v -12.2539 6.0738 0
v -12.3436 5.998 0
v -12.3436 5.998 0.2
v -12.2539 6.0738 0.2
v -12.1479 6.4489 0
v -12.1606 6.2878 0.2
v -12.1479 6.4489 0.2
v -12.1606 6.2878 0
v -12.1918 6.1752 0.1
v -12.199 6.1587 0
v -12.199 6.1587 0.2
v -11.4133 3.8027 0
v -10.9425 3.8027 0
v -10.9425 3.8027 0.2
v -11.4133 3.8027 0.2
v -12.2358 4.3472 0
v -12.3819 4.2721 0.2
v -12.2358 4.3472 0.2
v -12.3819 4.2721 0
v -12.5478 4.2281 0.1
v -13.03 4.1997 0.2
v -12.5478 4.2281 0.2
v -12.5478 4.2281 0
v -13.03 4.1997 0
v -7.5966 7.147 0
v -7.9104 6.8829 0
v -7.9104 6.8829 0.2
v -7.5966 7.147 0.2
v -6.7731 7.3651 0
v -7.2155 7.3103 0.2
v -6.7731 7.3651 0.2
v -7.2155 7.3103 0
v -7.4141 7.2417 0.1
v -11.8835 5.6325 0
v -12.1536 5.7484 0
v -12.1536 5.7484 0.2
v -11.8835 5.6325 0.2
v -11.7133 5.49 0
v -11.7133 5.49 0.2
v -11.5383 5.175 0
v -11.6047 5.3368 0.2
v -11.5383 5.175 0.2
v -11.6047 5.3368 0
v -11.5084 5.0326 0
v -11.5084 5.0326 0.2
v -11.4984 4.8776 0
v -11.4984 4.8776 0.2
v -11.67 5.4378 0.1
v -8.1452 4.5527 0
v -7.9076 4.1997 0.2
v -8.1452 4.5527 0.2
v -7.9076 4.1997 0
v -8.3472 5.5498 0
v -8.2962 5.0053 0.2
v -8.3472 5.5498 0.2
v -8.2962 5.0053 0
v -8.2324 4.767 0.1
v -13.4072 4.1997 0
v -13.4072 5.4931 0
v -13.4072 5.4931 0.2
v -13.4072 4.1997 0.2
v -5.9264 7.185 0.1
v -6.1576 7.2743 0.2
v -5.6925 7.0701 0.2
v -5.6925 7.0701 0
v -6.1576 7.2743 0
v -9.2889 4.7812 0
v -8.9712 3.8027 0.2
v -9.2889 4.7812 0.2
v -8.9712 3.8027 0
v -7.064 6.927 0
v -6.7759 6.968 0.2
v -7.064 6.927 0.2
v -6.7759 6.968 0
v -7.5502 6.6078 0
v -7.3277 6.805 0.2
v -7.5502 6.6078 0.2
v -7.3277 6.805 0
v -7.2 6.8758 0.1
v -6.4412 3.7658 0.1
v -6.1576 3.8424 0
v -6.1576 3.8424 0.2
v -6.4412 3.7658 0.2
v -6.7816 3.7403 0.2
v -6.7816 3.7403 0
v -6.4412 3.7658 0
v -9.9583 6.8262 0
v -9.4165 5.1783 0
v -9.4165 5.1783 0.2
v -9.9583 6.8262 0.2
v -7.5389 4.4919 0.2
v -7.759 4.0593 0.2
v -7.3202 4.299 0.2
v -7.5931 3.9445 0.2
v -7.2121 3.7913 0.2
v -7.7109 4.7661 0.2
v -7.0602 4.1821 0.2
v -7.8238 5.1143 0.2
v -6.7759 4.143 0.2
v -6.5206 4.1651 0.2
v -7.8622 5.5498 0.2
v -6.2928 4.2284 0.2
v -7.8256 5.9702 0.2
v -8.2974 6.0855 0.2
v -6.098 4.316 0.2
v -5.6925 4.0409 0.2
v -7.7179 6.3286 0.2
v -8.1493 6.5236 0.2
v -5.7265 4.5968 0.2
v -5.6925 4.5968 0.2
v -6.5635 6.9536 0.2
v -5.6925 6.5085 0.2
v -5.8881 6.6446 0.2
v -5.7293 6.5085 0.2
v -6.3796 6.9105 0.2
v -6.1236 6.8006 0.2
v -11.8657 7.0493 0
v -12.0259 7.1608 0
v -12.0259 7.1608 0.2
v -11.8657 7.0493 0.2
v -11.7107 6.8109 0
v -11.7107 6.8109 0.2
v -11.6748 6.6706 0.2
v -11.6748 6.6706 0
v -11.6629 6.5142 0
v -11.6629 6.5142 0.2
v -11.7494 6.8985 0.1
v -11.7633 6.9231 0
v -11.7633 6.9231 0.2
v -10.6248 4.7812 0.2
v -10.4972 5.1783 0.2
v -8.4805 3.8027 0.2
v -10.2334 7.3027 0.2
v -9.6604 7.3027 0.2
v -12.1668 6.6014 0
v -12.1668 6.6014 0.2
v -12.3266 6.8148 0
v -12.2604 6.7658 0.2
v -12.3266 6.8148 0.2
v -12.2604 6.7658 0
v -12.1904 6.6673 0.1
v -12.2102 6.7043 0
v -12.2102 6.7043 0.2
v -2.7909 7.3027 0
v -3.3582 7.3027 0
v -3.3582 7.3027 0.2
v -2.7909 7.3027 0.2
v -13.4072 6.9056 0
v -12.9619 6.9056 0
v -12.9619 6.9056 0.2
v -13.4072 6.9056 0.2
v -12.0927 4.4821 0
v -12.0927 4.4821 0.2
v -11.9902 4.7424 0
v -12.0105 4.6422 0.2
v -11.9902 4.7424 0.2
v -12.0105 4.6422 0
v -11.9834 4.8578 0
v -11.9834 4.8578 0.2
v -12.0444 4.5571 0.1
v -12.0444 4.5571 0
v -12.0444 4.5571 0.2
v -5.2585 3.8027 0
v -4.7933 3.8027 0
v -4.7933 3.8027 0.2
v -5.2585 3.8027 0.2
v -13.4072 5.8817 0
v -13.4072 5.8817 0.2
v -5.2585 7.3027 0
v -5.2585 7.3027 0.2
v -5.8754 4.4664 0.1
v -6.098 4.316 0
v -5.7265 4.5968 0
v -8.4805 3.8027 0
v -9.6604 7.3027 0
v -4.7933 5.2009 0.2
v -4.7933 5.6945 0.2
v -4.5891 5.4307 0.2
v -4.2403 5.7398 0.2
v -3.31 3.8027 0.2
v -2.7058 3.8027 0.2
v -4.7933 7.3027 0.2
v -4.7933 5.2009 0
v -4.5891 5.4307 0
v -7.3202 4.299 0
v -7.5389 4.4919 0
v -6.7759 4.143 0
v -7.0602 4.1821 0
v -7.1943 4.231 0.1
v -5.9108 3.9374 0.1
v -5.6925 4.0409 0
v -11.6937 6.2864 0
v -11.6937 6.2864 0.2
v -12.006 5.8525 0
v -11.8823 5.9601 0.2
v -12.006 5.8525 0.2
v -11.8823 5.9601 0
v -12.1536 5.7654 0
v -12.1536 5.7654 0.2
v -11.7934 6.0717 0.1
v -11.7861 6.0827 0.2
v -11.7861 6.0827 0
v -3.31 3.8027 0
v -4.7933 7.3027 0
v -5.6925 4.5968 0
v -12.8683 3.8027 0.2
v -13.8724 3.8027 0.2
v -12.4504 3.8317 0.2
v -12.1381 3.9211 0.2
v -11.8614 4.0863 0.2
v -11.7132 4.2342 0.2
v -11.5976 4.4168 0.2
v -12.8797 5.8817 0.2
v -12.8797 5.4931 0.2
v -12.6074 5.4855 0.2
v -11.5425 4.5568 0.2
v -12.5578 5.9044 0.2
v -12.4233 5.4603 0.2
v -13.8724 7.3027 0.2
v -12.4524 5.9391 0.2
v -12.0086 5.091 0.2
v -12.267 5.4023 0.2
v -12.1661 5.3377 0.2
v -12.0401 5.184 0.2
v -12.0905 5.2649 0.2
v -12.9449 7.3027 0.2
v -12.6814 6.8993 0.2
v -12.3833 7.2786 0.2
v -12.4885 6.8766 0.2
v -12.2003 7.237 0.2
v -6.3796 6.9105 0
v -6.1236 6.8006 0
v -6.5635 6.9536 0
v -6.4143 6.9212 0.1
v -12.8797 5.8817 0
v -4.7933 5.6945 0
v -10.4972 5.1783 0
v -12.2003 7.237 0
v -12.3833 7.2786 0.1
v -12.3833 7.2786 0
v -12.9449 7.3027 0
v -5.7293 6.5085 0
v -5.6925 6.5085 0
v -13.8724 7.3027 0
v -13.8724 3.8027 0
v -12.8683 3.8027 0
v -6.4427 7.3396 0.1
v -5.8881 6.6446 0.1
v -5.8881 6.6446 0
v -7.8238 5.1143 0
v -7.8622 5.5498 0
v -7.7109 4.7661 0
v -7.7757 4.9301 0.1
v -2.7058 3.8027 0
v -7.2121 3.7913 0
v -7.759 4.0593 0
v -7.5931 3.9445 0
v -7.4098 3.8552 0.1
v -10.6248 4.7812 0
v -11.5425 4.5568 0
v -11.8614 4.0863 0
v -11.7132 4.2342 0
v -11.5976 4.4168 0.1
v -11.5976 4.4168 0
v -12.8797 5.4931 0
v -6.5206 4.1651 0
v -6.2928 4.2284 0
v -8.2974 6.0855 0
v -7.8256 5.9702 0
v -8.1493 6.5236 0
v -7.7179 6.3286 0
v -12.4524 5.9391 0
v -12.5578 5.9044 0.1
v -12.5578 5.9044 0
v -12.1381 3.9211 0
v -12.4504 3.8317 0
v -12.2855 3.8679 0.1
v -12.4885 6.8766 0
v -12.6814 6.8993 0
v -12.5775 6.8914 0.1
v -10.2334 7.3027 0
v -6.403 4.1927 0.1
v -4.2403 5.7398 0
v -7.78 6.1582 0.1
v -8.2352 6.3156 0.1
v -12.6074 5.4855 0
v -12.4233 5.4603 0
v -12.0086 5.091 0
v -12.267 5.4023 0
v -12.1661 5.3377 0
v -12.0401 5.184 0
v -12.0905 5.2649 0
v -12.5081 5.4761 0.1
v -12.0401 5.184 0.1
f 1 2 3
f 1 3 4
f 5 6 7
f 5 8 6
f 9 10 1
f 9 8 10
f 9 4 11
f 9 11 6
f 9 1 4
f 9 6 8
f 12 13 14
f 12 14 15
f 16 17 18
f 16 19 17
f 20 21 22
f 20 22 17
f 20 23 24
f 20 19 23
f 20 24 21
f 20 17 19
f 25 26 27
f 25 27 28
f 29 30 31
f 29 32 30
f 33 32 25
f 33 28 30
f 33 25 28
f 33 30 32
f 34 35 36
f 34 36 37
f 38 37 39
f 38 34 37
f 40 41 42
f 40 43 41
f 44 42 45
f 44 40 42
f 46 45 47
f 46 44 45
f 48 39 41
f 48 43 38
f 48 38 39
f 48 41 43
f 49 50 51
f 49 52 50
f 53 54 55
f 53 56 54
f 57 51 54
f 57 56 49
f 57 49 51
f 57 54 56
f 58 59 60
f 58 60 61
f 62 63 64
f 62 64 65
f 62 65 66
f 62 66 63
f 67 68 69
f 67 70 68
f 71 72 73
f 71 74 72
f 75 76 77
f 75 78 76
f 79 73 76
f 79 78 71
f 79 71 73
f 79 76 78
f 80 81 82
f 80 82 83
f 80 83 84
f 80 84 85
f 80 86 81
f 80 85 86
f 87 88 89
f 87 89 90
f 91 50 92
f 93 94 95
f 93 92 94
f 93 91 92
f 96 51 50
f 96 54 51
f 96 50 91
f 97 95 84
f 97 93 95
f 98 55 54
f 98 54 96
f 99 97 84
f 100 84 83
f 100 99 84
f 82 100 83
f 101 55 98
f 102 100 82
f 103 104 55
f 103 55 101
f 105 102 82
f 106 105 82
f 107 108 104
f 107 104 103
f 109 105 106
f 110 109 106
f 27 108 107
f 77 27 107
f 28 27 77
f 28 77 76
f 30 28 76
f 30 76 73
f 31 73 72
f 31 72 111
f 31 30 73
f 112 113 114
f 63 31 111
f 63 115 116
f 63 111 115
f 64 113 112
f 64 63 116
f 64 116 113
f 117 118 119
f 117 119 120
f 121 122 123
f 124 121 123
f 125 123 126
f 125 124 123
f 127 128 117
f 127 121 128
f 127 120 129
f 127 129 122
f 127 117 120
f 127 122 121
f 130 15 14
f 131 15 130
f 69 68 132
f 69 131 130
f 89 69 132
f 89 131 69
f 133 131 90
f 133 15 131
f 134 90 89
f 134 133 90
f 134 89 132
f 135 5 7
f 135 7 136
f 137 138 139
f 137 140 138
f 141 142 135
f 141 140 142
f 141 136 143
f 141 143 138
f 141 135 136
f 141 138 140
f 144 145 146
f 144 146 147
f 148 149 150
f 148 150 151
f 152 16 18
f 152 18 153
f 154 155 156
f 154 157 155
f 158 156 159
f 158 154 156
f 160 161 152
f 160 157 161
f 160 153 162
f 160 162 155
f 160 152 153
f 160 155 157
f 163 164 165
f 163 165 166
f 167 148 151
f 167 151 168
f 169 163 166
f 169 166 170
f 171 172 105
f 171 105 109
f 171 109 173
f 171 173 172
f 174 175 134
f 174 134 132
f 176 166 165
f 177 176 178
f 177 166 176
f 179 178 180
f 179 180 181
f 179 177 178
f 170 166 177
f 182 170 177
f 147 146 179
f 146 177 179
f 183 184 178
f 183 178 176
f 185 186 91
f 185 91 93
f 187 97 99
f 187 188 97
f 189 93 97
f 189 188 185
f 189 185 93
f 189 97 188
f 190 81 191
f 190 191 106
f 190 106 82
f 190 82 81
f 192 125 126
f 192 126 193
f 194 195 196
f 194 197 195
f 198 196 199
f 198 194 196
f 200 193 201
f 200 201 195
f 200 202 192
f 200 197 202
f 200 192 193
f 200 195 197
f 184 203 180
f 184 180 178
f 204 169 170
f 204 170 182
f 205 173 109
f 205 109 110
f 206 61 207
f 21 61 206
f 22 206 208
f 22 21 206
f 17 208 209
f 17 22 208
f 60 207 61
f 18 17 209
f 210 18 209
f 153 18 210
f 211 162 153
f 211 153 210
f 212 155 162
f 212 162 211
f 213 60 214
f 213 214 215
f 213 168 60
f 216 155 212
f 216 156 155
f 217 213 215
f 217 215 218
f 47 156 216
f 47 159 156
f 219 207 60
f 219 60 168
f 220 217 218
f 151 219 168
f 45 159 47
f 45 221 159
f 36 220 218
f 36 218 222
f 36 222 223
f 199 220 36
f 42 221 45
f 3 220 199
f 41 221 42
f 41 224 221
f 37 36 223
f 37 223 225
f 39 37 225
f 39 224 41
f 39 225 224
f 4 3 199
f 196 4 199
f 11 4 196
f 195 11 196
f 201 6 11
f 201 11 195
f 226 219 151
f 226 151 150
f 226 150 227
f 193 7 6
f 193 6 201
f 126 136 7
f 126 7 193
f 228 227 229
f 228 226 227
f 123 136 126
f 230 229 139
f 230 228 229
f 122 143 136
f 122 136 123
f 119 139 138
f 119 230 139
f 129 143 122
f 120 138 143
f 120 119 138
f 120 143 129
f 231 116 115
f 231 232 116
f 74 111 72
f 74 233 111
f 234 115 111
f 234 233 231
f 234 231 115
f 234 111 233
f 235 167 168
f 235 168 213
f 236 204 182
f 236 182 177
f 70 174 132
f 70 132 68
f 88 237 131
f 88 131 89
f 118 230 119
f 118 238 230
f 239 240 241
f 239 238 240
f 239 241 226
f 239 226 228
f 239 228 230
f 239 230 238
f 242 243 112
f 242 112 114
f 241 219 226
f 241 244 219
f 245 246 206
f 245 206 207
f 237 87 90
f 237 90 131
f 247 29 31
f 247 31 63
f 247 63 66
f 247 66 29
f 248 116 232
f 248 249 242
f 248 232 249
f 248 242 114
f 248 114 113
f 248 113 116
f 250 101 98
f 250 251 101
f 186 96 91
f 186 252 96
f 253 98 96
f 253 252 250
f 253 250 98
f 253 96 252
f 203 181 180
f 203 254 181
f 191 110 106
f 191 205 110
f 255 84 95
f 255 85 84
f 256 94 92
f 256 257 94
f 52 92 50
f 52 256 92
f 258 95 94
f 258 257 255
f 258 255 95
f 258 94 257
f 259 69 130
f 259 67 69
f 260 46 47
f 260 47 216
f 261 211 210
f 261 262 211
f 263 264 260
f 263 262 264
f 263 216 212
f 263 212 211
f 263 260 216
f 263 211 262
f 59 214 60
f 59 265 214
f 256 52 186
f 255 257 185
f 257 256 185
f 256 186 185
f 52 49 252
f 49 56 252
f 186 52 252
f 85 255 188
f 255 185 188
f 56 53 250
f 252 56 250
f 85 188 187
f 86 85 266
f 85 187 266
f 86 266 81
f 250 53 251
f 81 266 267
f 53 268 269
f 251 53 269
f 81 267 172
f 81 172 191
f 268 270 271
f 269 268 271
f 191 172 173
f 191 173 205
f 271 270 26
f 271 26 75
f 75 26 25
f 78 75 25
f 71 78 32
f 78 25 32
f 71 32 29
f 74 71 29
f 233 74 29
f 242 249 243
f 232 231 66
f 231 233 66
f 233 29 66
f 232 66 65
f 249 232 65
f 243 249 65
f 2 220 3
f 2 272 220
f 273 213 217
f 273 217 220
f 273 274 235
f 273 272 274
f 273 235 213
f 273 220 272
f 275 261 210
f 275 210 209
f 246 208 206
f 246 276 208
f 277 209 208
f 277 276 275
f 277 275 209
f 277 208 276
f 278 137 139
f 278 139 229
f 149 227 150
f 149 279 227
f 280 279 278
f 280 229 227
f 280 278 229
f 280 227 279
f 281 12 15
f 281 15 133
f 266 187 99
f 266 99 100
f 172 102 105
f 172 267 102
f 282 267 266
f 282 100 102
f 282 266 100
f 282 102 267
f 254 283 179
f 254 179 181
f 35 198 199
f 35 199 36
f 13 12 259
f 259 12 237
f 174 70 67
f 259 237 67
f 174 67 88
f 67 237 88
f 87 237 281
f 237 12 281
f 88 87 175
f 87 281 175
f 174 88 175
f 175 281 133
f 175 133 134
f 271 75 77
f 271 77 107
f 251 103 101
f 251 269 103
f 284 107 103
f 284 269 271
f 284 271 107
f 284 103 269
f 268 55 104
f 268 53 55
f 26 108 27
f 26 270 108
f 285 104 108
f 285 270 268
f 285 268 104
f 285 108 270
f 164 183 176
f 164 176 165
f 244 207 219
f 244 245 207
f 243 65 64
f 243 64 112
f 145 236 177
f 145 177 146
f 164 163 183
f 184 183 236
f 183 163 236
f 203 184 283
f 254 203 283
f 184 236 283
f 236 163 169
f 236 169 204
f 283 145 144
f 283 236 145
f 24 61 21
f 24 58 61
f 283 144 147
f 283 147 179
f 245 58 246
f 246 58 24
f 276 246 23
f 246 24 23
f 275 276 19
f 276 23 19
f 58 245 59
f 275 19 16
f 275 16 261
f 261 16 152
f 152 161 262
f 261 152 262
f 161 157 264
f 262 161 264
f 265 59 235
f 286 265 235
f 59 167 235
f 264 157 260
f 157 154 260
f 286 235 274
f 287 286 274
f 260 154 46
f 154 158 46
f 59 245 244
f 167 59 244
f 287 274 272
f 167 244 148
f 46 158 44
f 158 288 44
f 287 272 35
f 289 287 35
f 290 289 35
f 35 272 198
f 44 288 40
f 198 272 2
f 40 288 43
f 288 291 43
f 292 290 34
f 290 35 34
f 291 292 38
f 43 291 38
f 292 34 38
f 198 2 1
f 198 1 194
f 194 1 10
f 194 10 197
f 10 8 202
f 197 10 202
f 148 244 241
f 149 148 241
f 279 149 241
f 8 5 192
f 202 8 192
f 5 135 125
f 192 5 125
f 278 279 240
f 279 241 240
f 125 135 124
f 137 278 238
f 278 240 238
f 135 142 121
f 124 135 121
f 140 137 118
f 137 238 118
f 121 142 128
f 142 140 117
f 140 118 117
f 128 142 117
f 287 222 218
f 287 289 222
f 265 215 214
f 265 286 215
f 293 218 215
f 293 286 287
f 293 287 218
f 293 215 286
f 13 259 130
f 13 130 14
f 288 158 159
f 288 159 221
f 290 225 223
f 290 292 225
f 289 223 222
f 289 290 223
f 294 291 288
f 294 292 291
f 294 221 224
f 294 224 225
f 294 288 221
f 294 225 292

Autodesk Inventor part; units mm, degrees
ref_plane "YZ Plane" through (0, 0, 0) normal (1, 0, 0) x (0, 1, 0)
ref_plane "XZ Plane" through (0, 0, 0) normal (0, 1, 0) x (-1, 0, 0)
ref_plane "XY Plane" through (0, 0, 0) normal (0, 0, 1) x (1, 0, 0)
sketch "Sketch1" plane through (0, 0, 0) normal (0, 0, 1) x (1, 0, 0)
  line L0 (-14.2269, 7.3651) -> (16.5142, 7.3651) construction
  line L1 (16.5142, 7.3651) -> (16.5142, -10.6587) construction
  line L2 (16.5142, -10.6587) -> (-14.2269, -10.6587) construction
  line L3 (-14.2269, -10.6587) -> (-14.2269, 7.3651) construction
  spline S0 degree 2 poles (-11.4984, 4.8776) (-11.4984, 4.6167) (-11.6969, 4.2168) (-11.8614, 4.0863) knots 0 0 0 1 2 2 2
  spline S1 degree 2 poles (-11.8614, 4.0863) (-12.06, 3.9331) (-12.5109, 3.8027) (-12.8683, 3.8027) knots 0 0 0 1 2 2 2
  line L4 (-12.8683, 3.8027) -> (-13.8724, 3.8027)
  line L5 (-13.8724, 3.8027) -> (-13.8724, 7.3027)
  line L6 (-13.8724, 7.3027) -> (-12.9449, 7.3027)
  spline S2 degree 2 poles (-12.9449, 7.3027) (-12.5705, 7.3027) (-12.1961, 7.2544) (-12.0259, 7.1608) knots 0 0 0 1 2 2 2
  spline S3 degree 2 poles (-12.0259, 7.1608) (-11.8359, 7.0616) (-11.6629, 6.7354) (-11.6629, 6.5142) knots 0 0 0 1 2 2 2
  spline S4 degree 2 poles (-11.6629, 6.5142) (-11.6629, 6.2674) (-11.9238, 5.876) (-12.1536, 5.7654) knots 0 0 0 1 2 2 2
  line L7 (-12.1536, 5.7654) -> (-12.1536, 5.7484)
  spline S5 degree 2 poles (-12.1536, 5.7484) (-11.8416, 5.6633) (-11.4984, 5.2123) (-11.4984, 4.8776) knots 0 0 0 1 2 2 2
  spline S6 degree 2 poles (-11.9834, 4.8578) (-11.9834, 5.0563) (-12.0968, 5.3116) (-12.267, 5.4023) knots 0 0 0 1 2 2 2
  spline S7 degree 2 poles (-12.267, 5.4023) (-12.3776, 5.4591) (-12.6386, 5.4931) (-12.8797, 5.4931) knots 0 0 0 1 2 2 2
  line L8 (-12.8797, 5.4931) -> (-13.4072, 5.4931)
  line L9 (-13.4072, 5.4931) -> (-13.4072, 4.1997)
  line L10 (-13.4072, 4.1997) -> (-13.03, 4.1997)
  spline S8 degree 2 poles (-13.03, 4.1997) (-12.7237, 4.1997) (-12.372, 4.2565) (-12.2358, 4.3472) knots 0 0 0 1 2 2 2
  spline S9 degree 2 poles (-12.2358, 4.3472) (-12.1053, 4.4408) (-11.9834, 4.6734) (-11.9834, 4.8578) knots 0 0 0 1 2 2 2
  spline S10 degree 2 poles (-12.1479, 6.4489) (-12.1479, 6.5737) (-12.233, 6.7609) (-12.3266, 6.8148) knots 0 0 0 1 2 2 2
  spline S11 degree 2 poles (-12.3266, 6.8148) (-12.44, 6.8772) (-12.7151, 6.9056) (-12.9619, 6.9056) knots 0 0 0 1 2 2 2
  line L11 (-12.9619, 6.9056) -> (-13.4072, 6.9056)
  line L12 (-13.4072, 6.9056) -> (-13.4072, 5.8817)
  line L13 (-13.4072, 5.8817) -> (-12.8797, 5.8817)
  spline S12 degree 2 poles (-12.8797, 5.8817) (-12.6613, 5.8817) (-12.4542, 5.927) (-12.3436, 5.998) knots 0 0 0 1 2 2 2
  spline S13 degree 2 poles (-12.3436, 5.998) (-12.2358, 6.066) (-12.1479, 6.2844) (-12.1479, 6.4489) knots 0 0 0 1 2 2 2
  line L14 (-11.4133, 3.8027) -> (-10.2334, 7.3027)
  line L15 (-10.2334, 7.3027) -> (-9.6604, 7.3027)
  line L16 (-9.6604, 7.3027) -> (-8.4805, 3.8027)
  line L17 (-8.4805, 3.8027) -> (-8.9712, 3.8027)
  line L18 (-8.9712, 3.8027) -> (-9.2889, 4.7812)
  line L19 (-9.2889, 4.7812) -> (-10.6248, 4.7812)
  line L20 (-10.6248, 4.7812) -> (-10.9425, 3.8027)
  line L21 (-10.9425, 3.8027) -> (-11.4133, 3.8027)
  line L22 (-9.4165, 5.1783) -> (-9.9583, 6.8262)
  line L23 (-9.9583, 6.8262) -> (-10.4972, 5.1783)
  line L24 (-10.4972, 5.1783) -> (-9.4165, 5.1783)
  spline S14 degree 2 poles (-6.7816, 3.7403) (-7.122, 3.7403) (-7.6977, 3.97) (-7.9076, 4.1997) knots 0 0 0 1 2 2 2
  spline S15 degree 2 poles (-7.9076, 4.1997) (-8.1175, 4.4266) (-8.3472, 5.1074) (-8.3472, 5.5498) knots 0 0 0 1 2 2 2
  spline S16 degree 2 poles (-8.3472, 5.5498) (-8.3472, 5.9894) (-8.1232, 6.6418) (-7.9104, 6.8829) knots 0 0 0 1 2 2 2
  spline S17 degree 2 poles (-7.9104, 6.8829) (-7.7006, 7.1183) (-7.1276, 7.3651) (-6.7731, 7.3651) knots 0 0 0 1 2 2 2
  spline S18 degree 2 poles (-6.7731, 7.3651) (-6.5972, 7.3651) (-6.2881, 7.314) (-6.1576, 7.2743) knots 0 0 0 1 2 2 2
  spline S19 degree 2 poles (-6.1576, 7.2743) (-6.0442, 7.2374) (-5.8087, 7.1325) (-5.6925, 7.0701) knots 0 0 0 1 2 2 2
  line L25 (-5.6925, 7.0701) -> (-5.6925, 6.5085)
  line L26 (-5.6925, 6.5085) -> (-5.7293, 6.5085)
  spline S20 degree 2 poles (-5.7293, 6.5085) (-5.7917, 6.5652) (-5.9846, 6.724) (-6.1236, 6.8006) knots 0 0 0 1 2 2 2
  spline S21 degree 2 poles (-6.1236, 6.8006) (-6.2569, 6.8744) (-6.5717, 6.968) (-6.7759, 6.968) knots 0 0 0 1 2 2 2
  spline S22 degree 2 poles (-6.7759, 6.968) (-7, 6.968) (-7.3999, 6.7836) (-7.5502, 6.6078) knots 0 0 0 1 2 2 2
  spline S23 degree 2 poles (-7.5502, 6.6078) (-7.6977, 6.4291) (-7.8622, 5.8873) (-7.8622, 5.5498) knots 0 0 0 1 2 2 2
  spline S24 degree 2 poles (-7.8622, 5.5498) (-7.8622, 5.1896) (-7.6892, 4.6706) (-7.5389, 4.4919) knots 0 0 0 1 2 2 2
  spline S25 degree 2 poles (-7.5389, 4.4919) (-7.3914, 4.3189) (-6.9972, 4.143) (-6.7759, 4.143) knots 0 0 0 1 2 2 2
  spline S26 degree 2 poles (-6.7759, 4.143) (-6.5745, 4.143) (-6.2314, 4.2423) (-6.098, 4.316) knots 0 0 0 1 2 2 2
  spline S27 degree 2 poles (-6.098, 4.316) (-5.9704, 4.3898) (-5.7804, 4.5429) (-5.7265, 4.5968) knots 0 0 0 1 2 2 2
  line L27 (-5.7265, 4.5968) -> (-5.6925, 4.5968)
  line L28 (-5.6925, 4.5968) -> (-5.6925, 4.0409)
  spline S28 degree 2 poles (-5.6925, 4.0409) (-5.8087, 3.987) (-6.013, 3.8877) (-6.1576, 3.8424) knots 0 0 0 1 2 2 2
  spline S29 degree 2 poles (-6.1576, 3.8424) (-6.3108, 3.7913) (-6.5717, 3.7403) (-6.7816, 3.7403) knots 0 0 0 1 2 2 2
  line L29 (-2.7058, 3.8027) -> (-3.31, 3.8027)
  line L30 (-3.31, 3.8027) -> (-4.5891, 5.4307)
  line L31 (-4.5891, 5.4307) -> (-4.7933, 5.2009)
  line L32 (-4.7933, 5.2009) -> (-4.7933, 3.8027)
  line L33 (-4.7933, 3.8027) -> (-5.2585, 3.8027)
  line L34 (-5.2585, 3.8027) -> (-5.2585, 7.3027)
  line L35 (-5.2585, 7.3027) -> (-4.7933, 7.3027)
  line L36 (-4.7933, 7.3027) -> (-4.7933, 5.6945)
  line L37 (-4.7933, 5.6945) -> (-3.3582, 7.3027)
  line L38 (-3.3582, 7.3027) -> (-2.7909, 7.3027)
  line L39 (-2.7909, 7.3027) -> (-4.2403, 5.7398)
  line L40 (-4.2403, 5.7398) -> (-2.7058, 3.8027)
  point P0 (0, 0)
extrude "BackLabel" add sketch "Sketch1" along normal blind 0.2
properties part number "BackLabel"
